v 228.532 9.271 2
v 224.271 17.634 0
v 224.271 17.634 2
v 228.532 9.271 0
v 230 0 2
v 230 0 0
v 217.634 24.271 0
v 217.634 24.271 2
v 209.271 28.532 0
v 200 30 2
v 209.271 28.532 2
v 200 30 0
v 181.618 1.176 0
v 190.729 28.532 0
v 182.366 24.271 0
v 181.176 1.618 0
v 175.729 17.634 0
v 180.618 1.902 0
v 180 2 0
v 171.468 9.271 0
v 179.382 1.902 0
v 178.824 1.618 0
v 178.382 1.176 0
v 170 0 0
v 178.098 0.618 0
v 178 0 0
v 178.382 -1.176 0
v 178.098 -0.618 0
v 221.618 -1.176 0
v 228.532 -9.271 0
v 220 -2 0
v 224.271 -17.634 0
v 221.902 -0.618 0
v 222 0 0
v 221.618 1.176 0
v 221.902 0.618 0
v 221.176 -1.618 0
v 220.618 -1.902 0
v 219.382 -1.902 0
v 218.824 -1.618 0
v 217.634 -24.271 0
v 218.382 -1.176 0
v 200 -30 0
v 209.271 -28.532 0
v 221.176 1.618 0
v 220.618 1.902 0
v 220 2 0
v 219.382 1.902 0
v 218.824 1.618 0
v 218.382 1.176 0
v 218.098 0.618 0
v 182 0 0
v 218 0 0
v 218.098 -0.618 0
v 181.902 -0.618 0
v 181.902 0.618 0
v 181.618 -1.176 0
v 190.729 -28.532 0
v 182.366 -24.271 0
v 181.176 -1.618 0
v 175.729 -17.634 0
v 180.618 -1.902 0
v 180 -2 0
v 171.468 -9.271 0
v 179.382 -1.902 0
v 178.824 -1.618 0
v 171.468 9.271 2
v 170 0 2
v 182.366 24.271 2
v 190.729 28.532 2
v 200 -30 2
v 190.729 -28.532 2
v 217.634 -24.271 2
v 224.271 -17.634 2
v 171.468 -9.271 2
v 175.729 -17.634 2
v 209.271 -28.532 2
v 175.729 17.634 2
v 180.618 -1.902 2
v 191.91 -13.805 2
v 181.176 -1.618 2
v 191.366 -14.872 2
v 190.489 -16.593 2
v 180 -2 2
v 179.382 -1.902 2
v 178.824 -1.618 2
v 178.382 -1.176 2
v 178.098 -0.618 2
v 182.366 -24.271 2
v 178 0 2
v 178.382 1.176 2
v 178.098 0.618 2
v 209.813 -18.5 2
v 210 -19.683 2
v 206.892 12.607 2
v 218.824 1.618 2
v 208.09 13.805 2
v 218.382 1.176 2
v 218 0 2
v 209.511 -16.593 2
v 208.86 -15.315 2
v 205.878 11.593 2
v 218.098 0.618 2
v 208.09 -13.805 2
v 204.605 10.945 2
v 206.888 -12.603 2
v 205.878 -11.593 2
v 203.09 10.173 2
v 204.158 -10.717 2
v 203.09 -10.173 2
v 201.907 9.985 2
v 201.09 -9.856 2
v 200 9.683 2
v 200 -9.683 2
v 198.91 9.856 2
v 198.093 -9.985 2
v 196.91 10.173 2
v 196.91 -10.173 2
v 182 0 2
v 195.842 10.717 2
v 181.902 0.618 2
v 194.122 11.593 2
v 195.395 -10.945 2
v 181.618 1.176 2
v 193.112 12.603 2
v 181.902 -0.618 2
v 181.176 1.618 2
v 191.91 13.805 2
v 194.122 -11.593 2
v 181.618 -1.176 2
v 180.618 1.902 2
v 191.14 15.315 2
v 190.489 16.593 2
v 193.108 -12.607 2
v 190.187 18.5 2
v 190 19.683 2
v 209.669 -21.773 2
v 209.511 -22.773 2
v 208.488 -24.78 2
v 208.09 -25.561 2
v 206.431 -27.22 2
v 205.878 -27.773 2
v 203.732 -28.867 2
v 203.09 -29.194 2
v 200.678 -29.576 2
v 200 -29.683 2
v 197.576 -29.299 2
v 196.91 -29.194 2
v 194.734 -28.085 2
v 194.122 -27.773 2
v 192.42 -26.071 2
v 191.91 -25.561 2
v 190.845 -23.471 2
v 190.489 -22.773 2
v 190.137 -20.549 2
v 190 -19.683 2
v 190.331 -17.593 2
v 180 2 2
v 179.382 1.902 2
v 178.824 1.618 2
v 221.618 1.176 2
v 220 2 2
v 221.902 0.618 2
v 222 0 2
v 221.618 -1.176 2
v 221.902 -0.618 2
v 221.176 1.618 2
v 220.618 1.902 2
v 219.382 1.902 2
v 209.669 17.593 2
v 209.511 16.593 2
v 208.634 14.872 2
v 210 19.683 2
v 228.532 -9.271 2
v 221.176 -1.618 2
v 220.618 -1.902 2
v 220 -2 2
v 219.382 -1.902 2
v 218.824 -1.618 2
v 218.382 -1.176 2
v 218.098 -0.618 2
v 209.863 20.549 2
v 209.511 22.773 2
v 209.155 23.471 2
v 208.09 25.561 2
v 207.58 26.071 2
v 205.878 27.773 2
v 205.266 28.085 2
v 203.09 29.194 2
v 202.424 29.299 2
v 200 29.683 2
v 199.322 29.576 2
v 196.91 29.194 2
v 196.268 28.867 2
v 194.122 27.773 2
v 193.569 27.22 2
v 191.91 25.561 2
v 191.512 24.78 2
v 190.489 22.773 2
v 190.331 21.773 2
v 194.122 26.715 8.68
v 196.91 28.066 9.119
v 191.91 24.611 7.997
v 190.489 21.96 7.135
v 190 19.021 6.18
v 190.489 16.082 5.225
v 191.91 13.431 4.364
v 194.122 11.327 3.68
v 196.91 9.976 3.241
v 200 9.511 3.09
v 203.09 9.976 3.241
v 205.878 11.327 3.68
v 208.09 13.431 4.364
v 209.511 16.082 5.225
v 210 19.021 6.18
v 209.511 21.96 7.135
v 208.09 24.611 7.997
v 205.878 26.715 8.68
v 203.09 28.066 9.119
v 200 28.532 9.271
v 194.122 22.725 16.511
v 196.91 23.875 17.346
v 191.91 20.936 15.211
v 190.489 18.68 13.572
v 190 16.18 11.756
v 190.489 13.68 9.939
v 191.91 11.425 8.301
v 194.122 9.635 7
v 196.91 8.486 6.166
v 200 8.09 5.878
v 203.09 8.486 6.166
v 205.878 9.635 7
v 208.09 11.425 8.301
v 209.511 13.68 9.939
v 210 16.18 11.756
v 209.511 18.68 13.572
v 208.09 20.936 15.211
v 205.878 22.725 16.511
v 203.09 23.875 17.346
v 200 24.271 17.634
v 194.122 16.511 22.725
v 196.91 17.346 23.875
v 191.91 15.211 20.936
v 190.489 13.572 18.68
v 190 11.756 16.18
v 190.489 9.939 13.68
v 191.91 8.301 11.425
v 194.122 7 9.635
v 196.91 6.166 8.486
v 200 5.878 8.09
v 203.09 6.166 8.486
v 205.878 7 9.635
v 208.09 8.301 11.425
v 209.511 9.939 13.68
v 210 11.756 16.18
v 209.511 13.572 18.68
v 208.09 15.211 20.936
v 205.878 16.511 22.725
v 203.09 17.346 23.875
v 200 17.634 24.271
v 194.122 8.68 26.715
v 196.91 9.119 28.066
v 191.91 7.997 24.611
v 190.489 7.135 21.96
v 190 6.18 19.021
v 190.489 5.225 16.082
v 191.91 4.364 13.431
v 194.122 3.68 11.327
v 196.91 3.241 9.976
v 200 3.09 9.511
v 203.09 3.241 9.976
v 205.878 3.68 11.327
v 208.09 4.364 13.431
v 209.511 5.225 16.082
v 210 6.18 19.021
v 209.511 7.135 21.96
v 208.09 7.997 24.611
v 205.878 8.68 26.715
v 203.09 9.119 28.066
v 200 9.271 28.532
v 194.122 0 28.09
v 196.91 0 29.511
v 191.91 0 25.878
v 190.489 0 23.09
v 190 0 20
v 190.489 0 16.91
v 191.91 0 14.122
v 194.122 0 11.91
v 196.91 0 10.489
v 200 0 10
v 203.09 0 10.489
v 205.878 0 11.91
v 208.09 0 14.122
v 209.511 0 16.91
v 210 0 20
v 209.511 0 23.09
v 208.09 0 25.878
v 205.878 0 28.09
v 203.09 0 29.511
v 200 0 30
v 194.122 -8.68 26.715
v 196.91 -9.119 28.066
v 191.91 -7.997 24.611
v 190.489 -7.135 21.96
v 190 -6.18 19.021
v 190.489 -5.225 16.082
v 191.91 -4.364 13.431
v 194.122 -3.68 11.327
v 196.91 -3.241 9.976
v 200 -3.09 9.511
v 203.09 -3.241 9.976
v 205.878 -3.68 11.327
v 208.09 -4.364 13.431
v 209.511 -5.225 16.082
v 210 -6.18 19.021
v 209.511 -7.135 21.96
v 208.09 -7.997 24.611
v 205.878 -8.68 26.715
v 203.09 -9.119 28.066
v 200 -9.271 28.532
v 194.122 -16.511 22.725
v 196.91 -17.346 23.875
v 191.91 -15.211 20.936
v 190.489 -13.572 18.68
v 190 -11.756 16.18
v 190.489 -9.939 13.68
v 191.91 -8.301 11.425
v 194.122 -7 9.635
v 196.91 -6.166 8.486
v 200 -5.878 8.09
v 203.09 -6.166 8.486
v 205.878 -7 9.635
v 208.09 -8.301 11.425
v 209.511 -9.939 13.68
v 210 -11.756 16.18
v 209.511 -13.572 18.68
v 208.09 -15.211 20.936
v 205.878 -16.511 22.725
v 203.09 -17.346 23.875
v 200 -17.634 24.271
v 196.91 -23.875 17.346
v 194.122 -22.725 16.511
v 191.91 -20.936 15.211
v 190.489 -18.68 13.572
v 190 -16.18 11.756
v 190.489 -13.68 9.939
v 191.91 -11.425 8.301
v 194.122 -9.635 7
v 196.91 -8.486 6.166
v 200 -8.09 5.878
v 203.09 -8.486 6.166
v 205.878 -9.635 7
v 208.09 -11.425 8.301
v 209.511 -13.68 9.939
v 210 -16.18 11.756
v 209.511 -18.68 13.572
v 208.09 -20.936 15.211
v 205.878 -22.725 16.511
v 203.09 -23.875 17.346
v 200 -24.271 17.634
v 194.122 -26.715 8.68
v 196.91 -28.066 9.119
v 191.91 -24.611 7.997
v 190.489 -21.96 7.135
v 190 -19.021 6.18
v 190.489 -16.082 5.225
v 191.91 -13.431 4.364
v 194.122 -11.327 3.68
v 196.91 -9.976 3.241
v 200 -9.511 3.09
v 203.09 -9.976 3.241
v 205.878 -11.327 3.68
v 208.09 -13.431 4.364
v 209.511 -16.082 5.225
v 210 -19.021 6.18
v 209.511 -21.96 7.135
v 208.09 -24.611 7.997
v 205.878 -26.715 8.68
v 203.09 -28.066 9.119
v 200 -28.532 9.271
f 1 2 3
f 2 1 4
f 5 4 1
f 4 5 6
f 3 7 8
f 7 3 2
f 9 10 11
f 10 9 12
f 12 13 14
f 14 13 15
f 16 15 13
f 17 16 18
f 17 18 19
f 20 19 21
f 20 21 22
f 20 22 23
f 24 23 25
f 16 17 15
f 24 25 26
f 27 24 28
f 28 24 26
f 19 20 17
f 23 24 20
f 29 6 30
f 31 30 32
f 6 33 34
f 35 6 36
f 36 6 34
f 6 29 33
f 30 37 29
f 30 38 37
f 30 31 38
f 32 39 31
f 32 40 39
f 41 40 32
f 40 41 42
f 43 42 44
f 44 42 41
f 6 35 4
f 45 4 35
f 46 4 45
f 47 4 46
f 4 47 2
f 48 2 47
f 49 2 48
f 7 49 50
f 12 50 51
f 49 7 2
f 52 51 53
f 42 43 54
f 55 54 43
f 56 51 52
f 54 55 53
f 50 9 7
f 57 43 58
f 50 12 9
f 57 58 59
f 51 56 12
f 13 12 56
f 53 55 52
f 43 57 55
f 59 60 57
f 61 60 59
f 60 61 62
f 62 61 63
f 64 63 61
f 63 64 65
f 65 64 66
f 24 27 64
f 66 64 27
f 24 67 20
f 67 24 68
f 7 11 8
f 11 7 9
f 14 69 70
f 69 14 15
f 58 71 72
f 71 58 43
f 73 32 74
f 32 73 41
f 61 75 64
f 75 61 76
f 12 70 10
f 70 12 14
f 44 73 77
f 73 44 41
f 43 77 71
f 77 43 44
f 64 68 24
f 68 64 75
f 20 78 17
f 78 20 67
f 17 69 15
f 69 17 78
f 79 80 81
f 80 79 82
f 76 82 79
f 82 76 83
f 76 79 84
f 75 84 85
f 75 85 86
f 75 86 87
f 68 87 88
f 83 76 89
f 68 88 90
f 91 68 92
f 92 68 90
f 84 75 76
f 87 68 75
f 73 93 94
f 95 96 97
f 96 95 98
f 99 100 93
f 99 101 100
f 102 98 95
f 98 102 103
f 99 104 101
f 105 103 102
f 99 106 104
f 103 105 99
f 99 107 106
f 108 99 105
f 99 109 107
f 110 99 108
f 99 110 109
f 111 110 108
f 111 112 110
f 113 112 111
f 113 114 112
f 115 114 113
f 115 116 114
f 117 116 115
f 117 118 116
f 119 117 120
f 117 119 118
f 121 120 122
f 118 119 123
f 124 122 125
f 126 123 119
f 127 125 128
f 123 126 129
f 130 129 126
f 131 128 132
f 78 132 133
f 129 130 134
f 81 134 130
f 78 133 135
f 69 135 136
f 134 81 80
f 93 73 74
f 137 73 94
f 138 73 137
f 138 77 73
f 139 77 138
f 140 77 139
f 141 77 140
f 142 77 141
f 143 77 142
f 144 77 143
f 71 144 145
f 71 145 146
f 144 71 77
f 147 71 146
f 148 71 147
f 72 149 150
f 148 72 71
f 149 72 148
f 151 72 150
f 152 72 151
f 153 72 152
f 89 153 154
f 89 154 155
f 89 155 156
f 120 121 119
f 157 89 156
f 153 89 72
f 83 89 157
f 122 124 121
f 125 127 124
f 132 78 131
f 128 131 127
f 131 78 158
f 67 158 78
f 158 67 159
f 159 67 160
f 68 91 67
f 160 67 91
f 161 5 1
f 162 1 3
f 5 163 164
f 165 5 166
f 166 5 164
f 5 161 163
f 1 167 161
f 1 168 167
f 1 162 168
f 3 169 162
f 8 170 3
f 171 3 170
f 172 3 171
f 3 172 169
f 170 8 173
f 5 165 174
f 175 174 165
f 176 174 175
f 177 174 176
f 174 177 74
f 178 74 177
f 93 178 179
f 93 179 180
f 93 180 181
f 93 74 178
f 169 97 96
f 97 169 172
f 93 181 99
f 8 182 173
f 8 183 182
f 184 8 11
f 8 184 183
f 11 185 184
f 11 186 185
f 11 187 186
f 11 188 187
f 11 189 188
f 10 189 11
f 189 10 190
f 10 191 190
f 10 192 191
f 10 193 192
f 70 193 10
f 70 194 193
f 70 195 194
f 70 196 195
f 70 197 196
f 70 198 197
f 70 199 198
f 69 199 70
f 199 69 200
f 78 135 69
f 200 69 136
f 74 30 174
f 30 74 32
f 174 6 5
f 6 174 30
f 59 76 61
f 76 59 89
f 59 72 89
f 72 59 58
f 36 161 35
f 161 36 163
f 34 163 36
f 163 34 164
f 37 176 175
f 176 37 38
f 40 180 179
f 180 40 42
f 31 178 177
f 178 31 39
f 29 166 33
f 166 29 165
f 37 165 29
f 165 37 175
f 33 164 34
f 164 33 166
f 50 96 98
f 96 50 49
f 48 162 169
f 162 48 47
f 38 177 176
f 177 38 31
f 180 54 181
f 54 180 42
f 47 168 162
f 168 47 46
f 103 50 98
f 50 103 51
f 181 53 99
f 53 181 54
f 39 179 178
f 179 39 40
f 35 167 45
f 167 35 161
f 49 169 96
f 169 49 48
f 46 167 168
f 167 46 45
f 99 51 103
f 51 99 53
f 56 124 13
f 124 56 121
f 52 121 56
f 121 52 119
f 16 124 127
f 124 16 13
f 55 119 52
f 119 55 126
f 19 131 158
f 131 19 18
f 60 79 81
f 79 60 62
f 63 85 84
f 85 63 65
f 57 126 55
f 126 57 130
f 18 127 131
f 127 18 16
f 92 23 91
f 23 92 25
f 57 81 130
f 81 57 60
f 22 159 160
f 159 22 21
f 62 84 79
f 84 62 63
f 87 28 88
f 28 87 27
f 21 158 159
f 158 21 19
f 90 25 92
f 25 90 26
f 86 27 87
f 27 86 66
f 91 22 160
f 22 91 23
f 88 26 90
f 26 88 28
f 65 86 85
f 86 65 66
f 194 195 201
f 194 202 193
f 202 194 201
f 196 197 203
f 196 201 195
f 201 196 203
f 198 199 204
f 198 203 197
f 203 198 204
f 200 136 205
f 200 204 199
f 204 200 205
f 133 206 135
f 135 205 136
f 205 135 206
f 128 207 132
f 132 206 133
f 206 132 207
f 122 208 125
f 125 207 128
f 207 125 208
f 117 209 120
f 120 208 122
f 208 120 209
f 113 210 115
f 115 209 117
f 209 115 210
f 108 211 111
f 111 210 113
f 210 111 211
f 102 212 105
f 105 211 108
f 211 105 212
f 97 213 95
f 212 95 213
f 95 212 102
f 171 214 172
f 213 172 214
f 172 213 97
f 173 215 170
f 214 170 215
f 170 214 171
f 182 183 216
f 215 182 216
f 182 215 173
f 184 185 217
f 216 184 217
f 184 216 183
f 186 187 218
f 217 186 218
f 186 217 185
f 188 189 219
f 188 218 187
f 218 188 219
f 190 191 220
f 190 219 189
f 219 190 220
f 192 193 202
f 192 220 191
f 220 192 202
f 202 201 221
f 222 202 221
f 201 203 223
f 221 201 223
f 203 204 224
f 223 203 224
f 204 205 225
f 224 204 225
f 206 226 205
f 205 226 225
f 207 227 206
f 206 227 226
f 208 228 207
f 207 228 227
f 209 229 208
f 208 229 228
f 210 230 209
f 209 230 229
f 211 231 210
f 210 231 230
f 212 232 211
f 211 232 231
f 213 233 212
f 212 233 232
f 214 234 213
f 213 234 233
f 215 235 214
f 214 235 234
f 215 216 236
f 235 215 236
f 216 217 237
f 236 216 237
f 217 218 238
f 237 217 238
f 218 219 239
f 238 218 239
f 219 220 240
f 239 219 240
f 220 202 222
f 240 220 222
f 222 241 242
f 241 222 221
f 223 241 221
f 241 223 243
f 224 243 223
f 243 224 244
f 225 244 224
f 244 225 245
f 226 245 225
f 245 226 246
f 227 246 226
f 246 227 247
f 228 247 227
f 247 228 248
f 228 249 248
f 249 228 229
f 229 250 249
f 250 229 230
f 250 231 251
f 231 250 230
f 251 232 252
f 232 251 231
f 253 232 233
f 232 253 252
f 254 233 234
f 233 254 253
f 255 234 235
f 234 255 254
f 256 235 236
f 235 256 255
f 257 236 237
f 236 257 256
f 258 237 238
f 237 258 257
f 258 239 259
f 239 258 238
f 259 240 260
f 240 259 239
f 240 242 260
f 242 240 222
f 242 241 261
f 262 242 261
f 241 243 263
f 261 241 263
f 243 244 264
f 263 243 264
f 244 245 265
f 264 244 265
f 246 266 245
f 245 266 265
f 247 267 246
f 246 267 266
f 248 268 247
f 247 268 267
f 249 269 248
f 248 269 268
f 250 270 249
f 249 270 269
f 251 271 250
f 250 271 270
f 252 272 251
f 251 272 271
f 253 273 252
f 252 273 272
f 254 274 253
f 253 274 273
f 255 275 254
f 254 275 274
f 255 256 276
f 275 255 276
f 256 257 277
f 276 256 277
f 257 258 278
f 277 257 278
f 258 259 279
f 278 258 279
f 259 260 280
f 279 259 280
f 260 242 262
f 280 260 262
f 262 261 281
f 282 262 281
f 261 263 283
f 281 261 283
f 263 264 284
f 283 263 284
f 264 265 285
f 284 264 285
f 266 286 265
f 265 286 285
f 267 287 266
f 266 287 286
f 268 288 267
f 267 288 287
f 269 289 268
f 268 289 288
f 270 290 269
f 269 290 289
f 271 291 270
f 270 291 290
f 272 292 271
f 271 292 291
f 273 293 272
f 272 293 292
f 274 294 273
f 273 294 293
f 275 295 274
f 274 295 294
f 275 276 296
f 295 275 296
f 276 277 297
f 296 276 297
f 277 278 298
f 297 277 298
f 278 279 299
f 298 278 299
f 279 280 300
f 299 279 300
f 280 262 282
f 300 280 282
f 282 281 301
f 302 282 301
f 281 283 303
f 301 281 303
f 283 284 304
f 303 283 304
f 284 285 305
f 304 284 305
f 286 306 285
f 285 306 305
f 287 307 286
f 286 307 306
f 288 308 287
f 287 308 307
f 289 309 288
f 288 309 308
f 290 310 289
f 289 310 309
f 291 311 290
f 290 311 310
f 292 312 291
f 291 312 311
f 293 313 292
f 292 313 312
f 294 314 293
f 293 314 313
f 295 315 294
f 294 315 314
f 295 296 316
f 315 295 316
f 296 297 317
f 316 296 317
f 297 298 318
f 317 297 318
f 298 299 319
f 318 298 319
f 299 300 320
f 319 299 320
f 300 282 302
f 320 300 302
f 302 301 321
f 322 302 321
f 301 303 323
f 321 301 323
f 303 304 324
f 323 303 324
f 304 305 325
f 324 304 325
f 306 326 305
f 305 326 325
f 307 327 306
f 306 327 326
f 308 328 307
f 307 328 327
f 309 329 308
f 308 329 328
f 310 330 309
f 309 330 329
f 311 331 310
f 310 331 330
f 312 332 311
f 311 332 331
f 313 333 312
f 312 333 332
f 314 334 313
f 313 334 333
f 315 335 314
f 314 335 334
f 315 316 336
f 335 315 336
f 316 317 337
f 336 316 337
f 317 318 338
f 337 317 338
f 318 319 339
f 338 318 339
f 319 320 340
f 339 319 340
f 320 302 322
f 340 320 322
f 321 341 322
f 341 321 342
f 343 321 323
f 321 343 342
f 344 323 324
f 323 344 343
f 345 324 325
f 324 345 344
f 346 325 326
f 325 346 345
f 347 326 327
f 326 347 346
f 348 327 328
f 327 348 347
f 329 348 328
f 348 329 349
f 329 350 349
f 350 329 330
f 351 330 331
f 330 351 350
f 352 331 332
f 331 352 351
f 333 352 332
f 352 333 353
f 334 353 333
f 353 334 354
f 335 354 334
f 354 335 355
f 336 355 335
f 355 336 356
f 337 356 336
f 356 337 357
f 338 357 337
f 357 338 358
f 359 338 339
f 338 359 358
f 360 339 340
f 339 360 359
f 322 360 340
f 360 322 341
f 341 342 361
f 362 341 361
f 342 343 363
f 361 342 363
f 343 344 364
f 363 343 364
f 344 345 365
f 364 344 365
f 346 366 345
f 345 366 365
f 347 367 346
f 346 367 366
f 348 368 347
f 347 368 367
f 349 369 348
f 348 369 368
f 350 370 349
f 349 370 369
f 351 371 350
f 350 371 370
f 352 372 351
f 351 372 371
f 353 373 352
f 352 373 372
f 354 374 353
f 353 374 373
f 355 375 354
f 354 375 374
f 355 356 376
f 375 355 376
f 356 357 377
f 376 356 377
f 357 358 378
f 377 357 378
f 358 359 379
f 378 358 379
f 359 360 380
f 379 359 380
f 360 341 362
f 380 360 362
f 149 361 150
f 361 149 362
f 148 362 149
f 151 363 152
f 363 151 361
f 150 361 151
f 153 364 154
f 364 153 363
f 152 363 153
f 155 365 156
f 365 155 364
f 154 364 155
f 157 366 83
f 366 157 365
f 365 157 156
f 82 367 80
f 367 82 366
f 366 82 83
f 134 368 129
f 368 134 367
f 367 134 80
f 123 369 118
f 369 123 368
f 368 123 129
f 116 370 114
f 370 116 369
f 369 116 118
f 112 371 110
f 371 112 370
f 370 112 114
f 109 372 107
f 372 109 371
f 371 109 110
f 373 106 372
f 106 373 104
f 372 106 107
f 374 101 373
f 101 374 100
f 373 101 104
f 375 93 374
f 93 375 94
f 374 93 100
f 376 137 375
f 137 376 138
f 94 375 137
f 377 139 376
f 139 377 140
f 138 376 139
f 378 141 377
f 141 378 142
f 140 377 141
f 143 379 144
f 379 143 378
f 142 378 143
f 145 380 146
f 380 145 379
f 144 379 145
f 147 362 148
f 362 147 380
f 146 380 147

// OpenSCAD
// file: bezier.scad
module line(p1,p2,w) {
    hull() {
        translate(p1) circle(r=w);
        translate(p2) circle(r=w);
    }
}
module polyline(points, index, w) {
    if(index < len(points)) {
        line(points[index - 1], points[index],w);
        polyline(points, index + 1, w);
    }
}

function choose(n, k)=
     k == 0? 1
    : (n * choose(n - 1, k - 1)) / k;

function _point_on_bezier_rec(points,t,i,c)=
    len(points) == i ? c
    : _point_on_bezier_rec(points,t,i+1,c+choose(len(points)-1,i) * pow(t,i) * pow(1-t,len(points)-i-1) * points[i]);

function _point_on_bezier(points,t)=
    _point_on_bezier_rec(points,t,0,[0,0]);

//a bezier curve with any number of control points
//parameters: 
//points - the control points of the bezier curve (number of points is variable)
//resolution - the sampling resolution of the bezier curve (number of returned points)
//returns:
//resolution number of samples on the bezier curve
function bezier(points,fn)=[
    for (t =[0:1.0/fn:1+(1/fn/2)]) _point_on_bezier(points, t)
    ];

//create a 3D rotational model with a bezier curve of given points, resolution and thickness
module bezier_model(points,resolution,thickness) {
    translate([0,0,thickness/2]) rotate_extrude() polyline(bezier(points,resolution),1,thickness/2);
}
    
// main file
print_base = false;
print_top = false;
print_holder = true;

//fillet = 10;
//
//radius_bottom_inner = 120;
//r = 140;
//r_roof = 155;
//
//radius_pole = 50;
//
//base_bottom_height = 50;
//
//h = 300;
//
////global strength
//s = 5;
//
//
//width_feeder_holes = 40;
//
//width_roof_holes = 20;
//
////for unperfectness in print, change to a small number
//margin = 2;
//
//roof_height = 100;
//
//width_roof_hang = 30;
//hang_holes_r = 8;
//
//resolution = 20;
//$fn=resolution;




fillet = 10;

radius_bottom_inner = 80;
r = 115;
r_roof = 120;

radius_pole = 40;

base_bottom_height = 30;

h = 200;

//global strength
s = 2;


width_feeder_holes = 40;

width_roof_holes = 17;
roof_holes_support_width = 2;
//for unperfectness in print, change to a small number
margin = 2;

roof_height = 80;

width_roof_hang = 30;
hang_holes_r = 8;

resolution = 20;
$fn=resolution;











use <bezier.scad>

function _get_paths(paths,i,fill_point)=
    i == len(paths)-2? [[paths[i],paths[i+1],fill_point]] :
    concat([[paths[i],paths[i+1],fill_point]],_get_paths(paths,i+1,fill_point));
    
function _range(maxi,i)=
    i == maxi? maxi
    : concat(i,_range(maxi,i+1));
    
module bezier_model_filled(points,fill_point,resolution,thickness) {
    bez_paths = _range(resolution,0);
    bezier_points = bezier(points,resolution);
    paths = _get_paths(bez_paths,0,len(bezier_points));
    translate([0,0,0]) 
        rotate_extrude()
            polygon(concat(bezier_points,[fill_point]),paths=paths);
}

if(print_base) {

    difference() {
        //base with pole
        union() {
        rotate_extrude() polygon( points=[[0,0],[radius_bottom_inner,0],[radius_bottom_inner,s],[radius_pole,s],[radius_pole,h],[radius_pole-s,h],[radius_pole-s,s],[0,s]] );
        bezier_model([[radius_bottom_inner,0],[r-fillet,0],[r,base_bottom_height],[r+2,base_bottom_height]],resolution,s);
        
            bezier_model_filled([[radius_bottom_inner-fillet,s],[radius_pole,s],[radius_pole-s/2,radius_pole]],[radius_pole-s/2,s],resolution,s);
            }
        //cut out feeder holes
        translate([0,radius_bottom_inner-fillet,s])rotate([90,0,0]) linear_extrude((radius_bottom_inner-fillet)*2) polygon(points=bezier([[-width_feeder_holes/2,0],[-width_feeder_holes/2,width_feeder_holes],[-2,width_feeder_holes],[2,width_feeder_holes],[width_feeder_holes/2,width_feeder_holes],[width_feeder_holes/2,0]],resolution));
        rotate([0,0,90])translate([0,radius_bottom_inner-fillet,s])rotate([90,0,0]) linear_extrude((radius_bottom_inner-fillet)*2) polygon(points=bezier([[-width_feeder_holes/2,0],[-width_feeder_holes/2,width_feeder_holes],[-2,width_feeder_holes],[2,width_feeder_holes],[width_feeder_holes/2,width_feeder_holes],[width_feeder_holes/2,0]],resolution));

        //cut out roof mountings
        for(variable = [0 : 90 : 360])
            rotate([0,0,variable])
        translate([-width_roof_holes/2,0,h-width_roof_holes*2])rotate([90,0,0])linear_extrude(500)
        polygon(points=[[0,0],[width_roof_holes*2+margin,0],[width_roof_holes*2+margin,width_roof_holes*2],[width_roof_holes,width_roof_holes*2],[width_roof_holes,0],[width_roof_holes-roof_holes_support_width,0],[width_roof_holes-roof_holes_support_width,width_roof_holes],[width_roof_holes/2,width_roof_holes*1.5],[0,width_roof_holes]]);

    }
}

if(print_top) {
    translate([0,0,h-width_roof_holes*2]) {
        //roof mount rods
        for(variable = [0 : 90 : 360])
            rotate([0,0,variable])
        translate([-width_roof_holes/2,0,0])rotate([90,0,0])linear_extrude(r_roof-s/2)
        polygon(points=[[0,0],[width_roof_holes,0],[width_roof_holes,width_roof_holes/2-margin],[width_roof_holes/2,width_roof_holes-margin],[0,width_roof_holes/2-margin]]);

        //main roof
        difference() {
        union() {
            bezier_model([[r_roof,0],[r_roof,roof_height/2],[width_roof_hang,roof_height-width_roof_hang],[width_roof_hang+s,roof_height]],resolution,s);
            rotate_extrude()polygon(points=concat(bezier([[width_roof_hang+s*1.5,roof_height],[width_roof_hang+s,roof_height+width_roof_hang*2],[0,roof_height+width_roof_hang*2]],resolution),[[0,roof_height]]));
        }


        //hang mount
        translate([0,0,roof_height+width_roof_hang])
        for(variable = [0 : 90 : 360])
            rotate([0,0,variable])
        rotate([90,0,0])cylinder(500,hang_holes_r,hang_holes_r);
        }
        
        //stabilyser cylinder for rods and roof
        cylinder(roof_height,width_roof_hang+s,width_roof_hang+s);

    }
}

holder_r = 30;
holder_screw_r = 2;
holder_ring_r = 10;

translate([200,0,0]) if(print_holder) {
    difference(){
        cylinder(s,holder_r,holder_r);
        translate([holder_r/1.5,0,0])cylinder(s,holder_screw_r,holder_screw_r);
        translate([-holder_r/1.5,0,0])cylinder(s,holder_screw_r,holder_screw_r);
    }
            rotate([90,0,90])rotate_extrude(angle=180) translate([holder_r-holder_ring_r,0,0])circle(holder_ring_r);

}
